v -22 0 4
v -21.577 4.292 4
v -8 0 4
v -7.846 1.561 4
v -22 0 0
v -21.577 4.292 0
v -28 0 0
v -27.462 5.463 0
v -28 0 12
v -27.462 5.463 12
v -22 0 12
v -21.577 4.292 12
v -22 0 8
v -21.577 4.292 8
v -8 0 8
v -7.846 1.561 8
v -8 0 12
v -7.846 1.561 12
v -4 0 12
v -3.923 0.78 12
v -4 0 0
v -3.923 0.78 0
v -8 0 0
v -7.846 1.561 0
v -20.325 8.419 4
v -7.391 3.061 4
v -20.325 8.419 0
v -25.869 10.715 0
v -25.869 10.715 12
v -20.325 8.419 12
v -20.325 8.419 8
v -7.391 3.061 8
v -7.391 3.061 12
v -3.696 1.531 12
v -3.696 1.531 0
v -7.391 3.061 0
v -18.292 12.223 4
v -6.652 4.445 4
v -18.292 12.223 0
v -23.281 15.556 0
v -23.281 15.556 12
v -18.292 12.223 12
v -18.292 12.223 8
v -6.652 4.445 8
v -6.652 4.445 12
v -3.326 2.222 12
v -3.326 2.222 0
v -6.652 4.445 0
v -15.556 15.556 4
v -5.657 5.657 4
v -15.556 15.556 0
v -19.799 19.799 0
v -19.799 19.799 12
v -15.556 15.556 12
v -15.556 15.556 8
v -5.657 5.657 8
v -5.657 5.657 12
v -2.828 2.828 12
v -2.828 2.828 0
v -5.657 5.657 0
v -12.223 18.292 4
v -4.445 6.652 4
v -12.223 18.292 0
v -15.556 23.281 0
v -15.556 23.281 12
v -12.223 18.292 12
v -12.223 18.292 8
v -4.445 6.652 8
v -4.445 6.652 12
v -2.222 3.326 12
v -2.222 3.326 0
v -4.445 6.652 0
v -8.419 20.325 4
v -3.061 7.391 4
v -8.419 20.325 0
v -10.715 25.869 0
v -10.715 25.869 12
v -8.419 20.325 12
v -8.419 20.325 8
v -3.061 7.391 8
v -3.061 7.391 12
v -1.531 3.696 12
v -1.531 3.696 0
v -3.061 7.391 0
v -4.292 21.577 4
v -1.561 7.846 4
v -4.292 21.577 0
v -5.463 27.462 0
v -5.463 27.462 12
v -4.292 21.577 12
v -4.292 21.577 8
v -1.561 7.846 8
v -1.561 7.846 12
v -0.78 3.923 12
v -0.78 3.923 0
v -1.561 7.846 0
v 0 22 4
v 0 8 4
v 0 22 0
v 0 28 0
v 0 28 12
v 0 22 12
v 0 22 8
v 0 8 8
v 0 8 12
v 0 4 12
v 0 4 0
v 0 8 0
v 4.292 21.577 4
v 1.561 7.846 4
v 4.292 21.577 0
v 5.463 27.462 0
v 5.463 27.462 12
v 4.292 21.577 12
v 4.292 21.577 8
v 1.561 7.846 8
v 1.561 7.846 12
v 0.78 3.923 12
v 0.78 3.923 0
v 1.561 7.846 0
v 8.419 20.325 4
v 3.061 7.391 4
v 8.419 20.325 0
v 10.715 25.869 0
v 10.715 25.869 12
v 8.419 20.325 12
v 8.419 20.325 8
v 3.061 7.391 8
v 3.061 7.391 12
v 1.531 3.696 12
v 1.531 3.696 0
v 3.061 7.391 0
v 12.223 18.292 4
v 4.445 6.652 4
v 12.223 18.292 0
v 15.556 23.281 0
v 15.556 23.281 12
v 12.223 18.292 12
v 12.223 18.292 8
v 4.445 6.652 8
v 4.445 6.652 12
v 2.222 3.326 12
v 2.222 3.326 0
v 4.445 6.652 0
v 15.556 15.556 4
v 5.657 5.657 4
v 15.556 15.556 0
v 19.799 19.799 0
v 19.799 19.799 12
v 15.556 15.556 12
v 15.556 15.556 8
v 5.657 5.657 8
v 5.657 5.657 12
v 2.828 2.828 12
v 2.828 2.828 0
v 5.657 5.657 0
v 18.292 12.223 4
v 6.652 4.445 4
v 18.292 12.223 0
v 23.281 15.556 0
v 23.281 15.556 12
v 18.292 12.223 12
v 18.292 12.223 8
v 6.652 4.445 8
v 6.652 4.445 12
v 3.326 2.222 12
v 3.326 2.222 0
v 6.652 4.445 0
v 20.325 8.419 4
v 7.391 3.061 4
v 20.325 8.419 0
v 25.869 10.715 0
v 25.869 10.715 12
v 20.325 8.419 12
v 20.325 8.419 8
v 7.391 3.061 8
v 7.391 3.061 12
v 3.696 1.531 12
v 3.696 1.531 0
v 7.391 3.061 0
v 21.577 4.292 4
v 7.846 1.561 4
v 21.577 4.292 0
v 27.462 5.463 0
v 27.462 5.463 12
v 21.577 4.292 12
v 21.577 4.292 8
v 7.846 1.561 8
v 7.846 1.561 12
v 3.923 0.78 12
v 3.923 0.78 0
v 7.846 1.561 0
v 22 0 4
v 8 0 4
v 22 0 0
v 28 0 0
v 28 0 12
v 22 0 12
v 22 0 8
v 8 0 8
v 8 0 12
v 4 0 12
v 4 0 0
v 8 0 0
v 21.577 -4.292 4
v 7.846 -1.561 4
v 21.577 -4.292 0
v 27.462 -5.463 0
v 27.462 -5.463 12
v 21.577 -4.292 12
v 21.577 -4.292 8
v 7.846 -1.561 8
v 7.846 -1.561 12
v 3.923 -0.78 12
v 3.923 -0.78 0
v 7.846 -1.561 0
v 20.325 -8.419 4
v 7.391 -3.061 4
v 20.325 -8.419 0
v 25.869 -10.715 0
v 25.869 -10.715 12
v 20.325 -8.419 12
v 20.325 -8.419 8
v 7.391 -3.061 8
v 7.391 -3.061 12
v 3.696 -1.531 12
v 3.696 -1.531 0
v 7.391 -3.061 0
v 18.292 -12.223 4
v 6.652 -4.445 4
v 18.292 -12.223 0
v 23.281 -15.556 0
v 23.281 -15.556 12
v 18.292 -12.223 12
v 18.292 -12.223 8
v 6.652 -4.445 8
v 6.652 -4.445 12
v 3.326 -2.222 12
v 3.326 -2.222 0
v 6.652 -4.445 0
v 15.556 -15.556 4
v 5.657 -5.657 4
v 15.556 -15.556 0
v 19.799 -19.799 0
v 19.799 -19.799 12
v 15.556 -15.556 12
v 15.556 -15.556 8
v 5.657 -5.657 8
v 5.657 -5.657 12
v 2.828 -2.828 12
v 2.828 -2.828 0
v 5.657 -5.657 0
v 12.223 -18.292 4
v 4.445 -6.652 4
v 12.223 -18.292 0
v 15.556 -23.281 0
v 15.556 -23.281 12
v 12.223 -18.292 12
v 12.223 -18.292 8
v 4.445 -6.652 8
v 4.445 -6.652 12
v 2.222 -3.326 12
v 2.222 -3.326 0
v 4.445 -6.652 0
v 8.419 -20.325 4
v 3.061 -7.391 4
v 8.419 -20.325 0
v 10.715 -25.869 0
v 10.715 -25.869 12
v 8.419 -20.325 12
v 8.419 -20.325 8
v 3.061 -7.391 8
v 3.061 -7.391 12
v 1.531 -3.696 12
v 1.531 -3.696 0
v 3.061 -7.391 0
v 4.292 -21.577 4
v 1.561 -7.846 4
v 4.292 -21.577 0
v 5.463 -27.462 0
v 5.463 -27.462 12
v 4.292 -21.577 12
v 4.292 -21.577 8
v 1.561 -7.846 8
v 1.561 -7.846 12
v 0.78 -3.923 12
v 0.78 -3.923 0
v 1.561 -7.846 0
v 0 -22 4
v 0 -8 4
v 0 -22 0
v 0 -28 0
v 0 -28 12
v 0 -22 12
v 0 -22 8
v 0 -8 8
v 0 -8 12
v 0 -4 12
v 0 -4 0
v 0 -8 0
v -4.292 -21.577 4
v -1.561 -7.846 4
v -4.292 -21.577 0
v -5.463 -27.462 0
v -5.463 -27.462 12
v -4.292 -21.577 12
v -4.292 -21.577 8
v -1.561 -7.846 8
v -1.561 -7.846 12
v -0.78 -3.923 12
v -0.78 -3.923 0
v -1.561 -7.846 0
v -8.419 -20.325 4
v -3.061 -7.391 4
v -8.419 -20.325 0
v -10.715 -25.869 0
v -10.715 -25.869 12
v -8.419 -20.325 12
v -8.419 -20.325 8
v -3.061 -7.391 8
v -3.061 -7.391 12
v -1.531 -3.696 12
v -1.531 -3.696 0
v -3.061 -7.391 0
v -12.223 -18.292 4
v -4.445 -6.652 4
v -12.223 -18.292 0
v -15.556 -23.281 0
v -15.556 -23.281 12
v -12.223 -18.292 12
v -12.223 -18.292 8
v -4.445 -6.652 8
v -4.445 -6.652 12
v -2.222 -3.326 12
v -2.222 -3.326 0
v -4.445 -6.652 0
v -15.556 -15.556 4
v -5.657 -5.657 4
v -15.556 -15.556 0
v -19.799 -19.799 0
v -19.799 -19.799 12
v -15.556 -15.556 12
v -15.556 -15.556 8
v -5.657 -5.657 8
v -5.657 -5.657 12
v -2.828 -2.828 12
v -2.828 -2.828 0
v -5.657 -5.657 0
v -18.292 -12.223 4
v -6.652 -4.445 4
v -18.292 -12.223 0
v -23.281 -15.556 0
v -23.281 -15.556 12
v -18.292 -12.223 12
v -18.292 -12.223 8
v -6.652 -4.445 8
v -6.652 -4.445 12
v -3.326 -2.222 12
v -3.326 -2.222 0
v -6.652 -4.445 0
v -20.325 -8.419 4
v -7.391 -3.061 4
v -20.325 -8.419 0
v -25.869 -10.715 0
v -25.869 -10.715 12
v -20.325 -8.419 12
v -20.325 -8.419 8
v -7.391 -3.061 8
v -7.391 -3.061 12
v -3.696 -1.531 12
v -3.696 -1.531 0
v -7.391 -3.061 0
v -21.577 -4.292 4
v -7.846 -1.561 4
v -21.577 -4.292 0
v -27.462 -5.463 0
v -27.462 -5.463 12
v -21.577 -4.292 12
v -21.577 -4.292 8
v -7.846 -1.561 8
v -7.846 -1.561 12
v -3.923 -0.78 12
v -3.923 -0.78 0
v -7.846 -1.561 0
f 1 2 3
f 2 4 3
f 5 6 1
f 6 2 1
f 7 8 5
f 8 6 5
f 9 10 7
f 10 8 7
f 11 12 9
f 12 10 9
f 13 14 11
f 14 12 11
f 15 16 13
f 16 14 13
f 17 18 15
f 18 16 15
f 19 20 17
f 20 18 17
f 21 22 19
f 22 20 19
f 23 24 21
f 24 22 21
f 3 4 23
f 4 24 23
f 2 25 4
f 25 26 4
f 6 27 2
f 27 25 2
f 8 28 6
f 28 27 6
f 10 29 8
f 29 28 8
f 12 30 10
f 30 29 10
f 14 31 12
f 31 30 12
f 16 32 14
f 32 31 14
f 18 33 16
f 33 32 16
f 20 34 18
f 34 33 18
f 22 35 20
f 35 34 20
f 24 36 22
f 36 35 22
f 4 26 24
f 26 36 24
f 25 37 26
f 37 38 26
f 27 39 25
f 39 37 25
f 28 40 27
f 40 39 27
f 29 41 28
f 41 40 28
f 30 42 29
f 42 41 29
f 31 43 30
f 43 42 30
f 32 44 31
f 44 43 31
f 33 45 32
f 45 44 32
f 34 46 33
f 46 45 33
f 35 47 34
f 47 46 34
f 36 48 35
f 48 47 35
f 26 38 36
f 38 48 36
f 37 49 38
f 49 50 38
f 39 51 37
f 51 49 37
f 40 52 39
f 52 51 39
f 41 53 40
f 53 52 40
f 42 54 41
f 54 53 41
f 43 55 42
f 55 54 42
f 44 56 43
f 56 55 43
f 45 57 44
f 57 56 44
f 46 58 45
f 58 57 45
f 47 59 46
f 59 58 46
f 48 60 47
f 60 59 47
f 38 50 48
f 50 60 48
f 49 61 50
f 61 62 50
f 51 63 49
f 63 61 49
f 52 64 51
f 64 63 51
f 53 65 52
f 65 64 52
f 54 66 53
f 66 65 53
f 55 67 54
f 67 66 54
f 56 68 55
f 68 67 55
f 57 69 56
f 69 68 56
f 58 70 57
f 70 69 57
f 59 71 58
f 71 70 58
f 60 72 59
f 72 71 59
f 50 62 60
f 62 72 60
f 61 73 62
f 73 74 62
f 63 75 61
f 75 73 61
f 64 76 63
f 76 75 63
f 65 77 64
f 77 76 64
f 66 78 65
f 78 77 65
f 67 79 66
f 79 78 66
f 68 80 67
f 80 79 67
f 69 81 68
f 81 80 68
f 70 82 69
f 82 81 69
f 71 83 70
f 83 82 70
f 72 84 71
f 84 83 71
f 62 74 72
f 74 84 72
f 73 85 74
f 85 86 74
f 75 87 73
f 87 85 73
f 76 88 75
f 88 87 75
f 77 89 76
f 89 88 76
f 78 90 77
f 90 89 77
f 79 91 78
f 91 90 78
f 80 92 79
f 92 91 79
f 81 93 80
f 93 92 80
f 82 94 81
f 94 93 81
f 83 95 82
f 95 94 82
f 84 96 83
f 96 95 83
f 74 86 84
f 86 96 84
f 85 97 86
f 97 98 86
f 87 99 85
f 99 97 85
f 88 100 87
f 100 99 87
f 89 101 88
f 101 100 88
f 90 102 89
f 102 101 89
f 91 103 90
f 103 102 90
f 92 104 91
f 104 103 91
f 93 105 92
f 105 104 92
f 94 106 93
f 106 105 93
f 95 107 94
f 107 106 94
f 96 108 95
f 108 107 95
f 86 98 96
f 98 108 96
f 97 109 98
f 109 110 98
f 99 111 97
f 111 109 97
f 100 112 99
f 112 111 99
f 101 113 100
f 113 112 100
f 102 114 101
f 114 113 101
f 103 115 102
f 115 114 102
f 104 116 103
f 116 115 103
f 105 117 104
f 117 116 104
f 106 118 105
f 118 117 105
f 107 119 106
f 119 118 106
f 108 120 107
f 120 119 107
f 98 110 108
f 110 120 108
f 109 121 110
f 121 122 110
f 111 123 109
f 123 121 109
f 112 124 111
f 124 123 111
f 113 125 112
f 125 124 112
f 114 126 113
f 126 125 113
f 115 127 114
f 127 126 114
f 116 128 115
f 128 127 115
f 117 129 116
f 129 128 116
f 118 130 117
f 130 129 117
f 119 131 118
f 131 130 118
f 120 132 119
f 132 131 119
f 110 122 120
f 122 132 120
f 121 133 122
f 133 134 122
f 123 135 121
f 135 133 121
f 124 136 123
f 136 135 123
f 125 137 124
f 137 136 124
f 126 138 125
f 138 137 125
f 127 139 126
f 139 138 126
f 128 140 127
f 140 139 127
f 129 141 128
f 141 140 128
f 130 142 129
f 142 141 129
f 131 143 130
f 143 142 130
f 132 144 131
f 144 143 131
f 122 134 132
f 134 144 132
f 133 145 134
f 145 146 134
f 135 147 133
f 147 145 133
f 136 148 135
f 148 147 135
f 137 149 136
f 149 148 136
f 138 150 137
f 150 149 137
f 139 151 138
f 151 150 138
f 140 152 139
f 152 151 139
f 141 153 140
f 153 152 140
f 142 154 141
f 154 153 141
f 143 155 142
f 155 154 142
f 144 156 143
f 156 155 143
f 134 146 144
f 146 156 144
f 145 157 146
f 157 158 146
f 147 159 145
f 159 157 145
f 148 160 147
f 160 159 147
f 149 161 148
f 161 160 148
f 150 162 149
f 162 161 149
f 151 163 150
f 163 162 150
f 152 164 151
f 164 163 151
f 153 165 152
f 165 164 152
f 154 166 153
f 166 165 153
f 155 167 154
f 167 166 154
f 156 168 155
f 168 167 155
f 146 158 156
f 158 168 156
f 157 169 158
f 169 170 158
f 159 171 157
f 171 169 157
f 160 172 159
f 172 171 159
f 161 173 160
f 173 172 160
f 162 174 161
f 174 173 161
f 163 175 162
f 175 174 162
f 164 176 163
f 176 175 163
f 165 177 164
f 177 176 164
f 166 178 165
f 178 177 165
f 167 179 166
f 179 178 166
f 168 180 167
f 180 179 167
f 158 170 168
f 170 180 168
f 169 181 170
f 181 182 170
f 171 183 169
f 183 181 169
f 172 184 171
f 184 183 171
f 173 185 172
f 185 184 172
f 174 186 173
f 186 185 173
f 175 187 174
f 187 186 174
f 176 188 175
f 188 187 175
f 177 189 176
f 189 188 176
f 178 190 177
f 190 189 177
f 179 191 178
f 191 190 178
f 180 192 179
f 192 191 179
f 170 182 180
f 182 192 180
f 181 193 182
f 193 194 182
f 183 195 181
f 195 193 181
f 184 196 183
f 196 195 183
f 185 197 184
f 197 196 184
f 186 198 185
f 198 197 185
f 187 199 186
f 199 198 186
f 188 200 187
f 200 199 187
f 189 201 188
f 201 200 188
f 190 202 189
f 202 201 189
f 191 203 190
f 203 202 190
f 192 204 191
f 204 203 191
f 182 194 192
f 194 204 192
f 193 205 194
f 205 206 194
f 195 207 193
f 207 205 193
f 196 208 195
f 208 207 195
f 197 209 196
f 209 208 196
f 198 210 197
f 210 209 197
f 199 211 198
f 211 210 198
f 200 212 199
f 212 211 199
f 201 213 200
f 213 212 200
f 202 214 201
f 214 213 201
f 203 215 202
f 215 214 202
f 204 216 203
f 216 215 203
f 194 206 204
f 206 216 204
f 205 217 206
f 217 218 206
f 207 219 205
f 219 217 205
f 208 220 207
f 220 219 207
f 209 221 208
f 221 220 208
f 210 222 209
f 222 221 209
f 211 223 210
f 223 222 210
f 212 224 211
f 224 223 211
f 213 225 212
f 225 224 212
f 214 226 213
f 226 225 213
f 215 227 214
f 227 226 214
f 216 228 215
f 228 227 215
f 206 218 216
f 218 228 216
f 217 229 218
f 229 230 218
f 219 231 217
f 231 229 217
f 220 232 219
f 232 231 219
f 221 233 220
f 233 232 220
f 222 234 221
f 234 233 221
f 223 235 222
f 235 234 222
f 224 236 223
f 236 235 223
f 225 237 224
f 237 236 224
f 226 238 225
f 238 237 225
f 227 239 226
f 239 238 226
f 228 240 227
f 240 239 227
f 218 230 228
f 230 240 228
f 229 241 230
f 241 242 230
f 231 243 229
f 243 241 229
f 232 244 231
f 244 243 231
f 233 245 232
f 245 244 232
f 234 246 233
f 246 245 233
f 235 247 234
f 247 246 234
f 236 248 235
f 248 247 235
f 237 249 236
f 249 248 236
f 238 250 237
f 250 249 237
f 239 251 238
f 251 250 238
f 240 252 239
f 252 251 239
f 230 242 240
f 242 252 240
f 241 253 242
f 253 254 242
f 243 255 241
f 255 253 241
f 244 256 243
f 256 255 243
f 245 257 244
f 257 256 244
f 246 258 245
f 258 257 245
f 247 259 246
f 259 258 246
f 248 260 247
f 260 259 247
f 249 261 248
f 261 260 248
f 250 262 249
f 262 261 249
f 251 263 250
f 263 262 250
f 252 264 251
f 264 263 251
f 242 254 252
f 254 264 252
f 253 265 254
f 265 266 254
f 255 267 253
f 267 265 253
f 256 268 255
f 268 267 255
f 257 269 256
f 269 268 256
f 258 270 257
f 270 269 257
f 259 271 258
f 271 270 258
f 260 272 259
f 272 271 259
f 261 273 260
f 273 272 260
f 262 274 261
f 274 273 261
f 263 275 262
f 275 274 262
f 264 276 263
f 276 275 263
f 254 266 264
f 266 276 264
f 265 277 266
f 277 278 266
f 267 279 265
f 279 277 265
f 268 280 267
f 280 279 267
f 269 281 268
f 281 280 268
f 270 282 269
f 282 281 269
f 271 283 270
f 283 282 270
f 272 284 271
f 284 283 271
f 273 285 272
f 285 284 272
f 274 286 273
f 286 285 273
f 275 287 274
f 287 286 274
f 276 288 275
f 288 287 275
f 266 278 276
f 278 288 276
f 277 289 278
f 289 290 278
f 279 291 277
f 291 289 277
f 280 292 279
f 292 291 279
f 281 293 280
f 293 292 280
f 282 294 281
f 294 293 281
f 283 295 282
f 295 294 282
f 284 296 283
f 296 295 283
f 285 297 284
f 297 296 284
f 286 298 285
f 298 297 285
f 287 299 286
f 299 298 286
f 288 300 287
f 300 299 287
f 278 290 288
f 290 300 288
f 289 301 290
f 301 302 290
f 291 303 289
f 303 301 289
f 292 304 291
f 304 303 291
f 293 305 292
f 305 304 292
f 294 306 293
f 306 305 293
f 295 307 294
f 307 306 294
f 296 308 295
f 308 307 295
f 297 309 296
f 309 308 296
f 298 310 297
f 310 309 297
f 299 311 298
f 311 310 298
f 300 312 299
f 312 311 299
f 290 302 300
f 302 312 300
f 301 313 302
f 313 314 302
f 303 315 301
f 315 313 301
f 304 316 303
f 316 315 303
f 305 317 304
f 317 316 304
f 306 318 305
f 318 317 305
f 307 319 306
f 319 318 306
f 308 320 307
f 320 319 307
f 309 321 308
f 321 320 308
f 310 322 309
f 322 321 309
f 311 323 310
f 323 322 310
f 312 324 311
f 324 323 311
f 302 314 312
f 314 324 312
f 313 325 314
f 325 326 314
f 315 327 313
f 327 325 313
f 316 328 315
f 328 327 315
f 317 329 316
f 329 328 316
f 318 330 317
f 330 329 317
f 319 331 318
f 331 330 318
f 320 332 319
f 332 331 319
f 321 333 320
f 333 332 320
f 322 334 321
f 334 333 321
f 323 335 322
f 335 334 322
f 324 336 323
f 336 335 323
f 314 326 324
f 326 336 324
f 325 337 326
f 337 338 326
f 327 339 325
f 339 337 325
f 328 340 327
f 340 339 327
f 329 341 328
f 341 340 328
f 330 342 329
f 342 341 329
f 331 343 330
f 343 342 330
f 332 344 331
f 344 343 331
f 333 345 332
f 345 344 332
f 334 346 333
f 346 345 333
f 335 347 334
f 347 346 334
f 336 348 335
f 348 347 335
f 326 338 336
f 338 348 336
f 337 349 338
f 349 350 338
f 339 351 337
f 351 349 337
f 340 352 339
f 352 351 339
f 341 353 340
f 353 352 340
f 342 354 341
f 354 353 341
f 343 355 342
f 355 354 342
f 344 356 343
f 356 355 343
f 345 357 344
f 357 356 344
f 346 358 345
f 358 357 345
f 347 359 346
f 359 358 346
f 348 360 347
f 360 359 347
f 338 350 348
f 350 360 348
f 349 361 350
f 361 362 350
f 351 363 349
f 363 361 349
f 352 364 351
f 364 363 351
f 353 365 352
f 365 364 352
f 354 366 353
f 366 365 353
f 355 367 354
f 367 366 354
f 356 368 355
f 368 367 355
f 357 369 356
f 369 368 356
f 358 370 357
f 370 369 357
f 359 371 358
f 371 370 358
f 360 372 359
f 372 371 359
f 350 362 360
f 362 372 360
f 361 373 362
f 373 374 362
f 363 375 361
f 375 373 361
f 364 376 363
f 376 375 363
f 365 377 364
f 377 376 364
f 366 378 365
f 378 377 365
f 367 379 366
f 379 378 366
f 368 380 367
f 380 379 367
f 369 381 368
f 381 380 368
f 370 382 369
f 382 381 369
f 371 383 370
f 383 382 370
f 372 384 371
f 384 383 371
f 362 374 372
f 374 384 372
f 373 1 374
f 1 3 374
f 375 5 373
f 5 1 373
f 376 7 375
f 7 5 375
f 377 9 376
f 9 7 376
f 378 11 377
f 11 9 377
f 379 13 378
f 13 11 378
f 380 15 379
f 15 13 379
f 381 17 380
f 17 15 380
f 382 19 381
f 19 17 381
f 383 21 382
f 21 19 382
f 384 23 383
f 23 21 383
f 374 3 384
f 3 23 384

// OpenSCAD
$fn = 32;

// ----------------------------------------------------------------------
// Revolved part: handwheel R28
// ----------------------------------------------------------------------

// --- parameters (mm) ---
bore_r = 4;               // bore radius
rim_r = 28;               // rim radius
rim_w = 6;                // rim axial width
rim_t = 12;               // rim diameter height
hub_r = 8;                // hub radius
web_t = 4;                // web thickness
revolve_angle = 360;      // revolve sweep, degrees

bore_d = 2 * bore_r;
rim_d = 2 * rim_r;
hub_d = 2 * hub_r;

profile = [[4, 0], [8, 0], [8, 4], [22, 4], [22, 0], [28, 0], [28, 12], [22, 12], [22, 8], [8, 8], [8, 12], [4, 12]];  // primary outline, 12 points, counter clockwise

// --- the one profile operation ---
rotate_extrude(angle = revolve_angle) polygon(points = profile);
